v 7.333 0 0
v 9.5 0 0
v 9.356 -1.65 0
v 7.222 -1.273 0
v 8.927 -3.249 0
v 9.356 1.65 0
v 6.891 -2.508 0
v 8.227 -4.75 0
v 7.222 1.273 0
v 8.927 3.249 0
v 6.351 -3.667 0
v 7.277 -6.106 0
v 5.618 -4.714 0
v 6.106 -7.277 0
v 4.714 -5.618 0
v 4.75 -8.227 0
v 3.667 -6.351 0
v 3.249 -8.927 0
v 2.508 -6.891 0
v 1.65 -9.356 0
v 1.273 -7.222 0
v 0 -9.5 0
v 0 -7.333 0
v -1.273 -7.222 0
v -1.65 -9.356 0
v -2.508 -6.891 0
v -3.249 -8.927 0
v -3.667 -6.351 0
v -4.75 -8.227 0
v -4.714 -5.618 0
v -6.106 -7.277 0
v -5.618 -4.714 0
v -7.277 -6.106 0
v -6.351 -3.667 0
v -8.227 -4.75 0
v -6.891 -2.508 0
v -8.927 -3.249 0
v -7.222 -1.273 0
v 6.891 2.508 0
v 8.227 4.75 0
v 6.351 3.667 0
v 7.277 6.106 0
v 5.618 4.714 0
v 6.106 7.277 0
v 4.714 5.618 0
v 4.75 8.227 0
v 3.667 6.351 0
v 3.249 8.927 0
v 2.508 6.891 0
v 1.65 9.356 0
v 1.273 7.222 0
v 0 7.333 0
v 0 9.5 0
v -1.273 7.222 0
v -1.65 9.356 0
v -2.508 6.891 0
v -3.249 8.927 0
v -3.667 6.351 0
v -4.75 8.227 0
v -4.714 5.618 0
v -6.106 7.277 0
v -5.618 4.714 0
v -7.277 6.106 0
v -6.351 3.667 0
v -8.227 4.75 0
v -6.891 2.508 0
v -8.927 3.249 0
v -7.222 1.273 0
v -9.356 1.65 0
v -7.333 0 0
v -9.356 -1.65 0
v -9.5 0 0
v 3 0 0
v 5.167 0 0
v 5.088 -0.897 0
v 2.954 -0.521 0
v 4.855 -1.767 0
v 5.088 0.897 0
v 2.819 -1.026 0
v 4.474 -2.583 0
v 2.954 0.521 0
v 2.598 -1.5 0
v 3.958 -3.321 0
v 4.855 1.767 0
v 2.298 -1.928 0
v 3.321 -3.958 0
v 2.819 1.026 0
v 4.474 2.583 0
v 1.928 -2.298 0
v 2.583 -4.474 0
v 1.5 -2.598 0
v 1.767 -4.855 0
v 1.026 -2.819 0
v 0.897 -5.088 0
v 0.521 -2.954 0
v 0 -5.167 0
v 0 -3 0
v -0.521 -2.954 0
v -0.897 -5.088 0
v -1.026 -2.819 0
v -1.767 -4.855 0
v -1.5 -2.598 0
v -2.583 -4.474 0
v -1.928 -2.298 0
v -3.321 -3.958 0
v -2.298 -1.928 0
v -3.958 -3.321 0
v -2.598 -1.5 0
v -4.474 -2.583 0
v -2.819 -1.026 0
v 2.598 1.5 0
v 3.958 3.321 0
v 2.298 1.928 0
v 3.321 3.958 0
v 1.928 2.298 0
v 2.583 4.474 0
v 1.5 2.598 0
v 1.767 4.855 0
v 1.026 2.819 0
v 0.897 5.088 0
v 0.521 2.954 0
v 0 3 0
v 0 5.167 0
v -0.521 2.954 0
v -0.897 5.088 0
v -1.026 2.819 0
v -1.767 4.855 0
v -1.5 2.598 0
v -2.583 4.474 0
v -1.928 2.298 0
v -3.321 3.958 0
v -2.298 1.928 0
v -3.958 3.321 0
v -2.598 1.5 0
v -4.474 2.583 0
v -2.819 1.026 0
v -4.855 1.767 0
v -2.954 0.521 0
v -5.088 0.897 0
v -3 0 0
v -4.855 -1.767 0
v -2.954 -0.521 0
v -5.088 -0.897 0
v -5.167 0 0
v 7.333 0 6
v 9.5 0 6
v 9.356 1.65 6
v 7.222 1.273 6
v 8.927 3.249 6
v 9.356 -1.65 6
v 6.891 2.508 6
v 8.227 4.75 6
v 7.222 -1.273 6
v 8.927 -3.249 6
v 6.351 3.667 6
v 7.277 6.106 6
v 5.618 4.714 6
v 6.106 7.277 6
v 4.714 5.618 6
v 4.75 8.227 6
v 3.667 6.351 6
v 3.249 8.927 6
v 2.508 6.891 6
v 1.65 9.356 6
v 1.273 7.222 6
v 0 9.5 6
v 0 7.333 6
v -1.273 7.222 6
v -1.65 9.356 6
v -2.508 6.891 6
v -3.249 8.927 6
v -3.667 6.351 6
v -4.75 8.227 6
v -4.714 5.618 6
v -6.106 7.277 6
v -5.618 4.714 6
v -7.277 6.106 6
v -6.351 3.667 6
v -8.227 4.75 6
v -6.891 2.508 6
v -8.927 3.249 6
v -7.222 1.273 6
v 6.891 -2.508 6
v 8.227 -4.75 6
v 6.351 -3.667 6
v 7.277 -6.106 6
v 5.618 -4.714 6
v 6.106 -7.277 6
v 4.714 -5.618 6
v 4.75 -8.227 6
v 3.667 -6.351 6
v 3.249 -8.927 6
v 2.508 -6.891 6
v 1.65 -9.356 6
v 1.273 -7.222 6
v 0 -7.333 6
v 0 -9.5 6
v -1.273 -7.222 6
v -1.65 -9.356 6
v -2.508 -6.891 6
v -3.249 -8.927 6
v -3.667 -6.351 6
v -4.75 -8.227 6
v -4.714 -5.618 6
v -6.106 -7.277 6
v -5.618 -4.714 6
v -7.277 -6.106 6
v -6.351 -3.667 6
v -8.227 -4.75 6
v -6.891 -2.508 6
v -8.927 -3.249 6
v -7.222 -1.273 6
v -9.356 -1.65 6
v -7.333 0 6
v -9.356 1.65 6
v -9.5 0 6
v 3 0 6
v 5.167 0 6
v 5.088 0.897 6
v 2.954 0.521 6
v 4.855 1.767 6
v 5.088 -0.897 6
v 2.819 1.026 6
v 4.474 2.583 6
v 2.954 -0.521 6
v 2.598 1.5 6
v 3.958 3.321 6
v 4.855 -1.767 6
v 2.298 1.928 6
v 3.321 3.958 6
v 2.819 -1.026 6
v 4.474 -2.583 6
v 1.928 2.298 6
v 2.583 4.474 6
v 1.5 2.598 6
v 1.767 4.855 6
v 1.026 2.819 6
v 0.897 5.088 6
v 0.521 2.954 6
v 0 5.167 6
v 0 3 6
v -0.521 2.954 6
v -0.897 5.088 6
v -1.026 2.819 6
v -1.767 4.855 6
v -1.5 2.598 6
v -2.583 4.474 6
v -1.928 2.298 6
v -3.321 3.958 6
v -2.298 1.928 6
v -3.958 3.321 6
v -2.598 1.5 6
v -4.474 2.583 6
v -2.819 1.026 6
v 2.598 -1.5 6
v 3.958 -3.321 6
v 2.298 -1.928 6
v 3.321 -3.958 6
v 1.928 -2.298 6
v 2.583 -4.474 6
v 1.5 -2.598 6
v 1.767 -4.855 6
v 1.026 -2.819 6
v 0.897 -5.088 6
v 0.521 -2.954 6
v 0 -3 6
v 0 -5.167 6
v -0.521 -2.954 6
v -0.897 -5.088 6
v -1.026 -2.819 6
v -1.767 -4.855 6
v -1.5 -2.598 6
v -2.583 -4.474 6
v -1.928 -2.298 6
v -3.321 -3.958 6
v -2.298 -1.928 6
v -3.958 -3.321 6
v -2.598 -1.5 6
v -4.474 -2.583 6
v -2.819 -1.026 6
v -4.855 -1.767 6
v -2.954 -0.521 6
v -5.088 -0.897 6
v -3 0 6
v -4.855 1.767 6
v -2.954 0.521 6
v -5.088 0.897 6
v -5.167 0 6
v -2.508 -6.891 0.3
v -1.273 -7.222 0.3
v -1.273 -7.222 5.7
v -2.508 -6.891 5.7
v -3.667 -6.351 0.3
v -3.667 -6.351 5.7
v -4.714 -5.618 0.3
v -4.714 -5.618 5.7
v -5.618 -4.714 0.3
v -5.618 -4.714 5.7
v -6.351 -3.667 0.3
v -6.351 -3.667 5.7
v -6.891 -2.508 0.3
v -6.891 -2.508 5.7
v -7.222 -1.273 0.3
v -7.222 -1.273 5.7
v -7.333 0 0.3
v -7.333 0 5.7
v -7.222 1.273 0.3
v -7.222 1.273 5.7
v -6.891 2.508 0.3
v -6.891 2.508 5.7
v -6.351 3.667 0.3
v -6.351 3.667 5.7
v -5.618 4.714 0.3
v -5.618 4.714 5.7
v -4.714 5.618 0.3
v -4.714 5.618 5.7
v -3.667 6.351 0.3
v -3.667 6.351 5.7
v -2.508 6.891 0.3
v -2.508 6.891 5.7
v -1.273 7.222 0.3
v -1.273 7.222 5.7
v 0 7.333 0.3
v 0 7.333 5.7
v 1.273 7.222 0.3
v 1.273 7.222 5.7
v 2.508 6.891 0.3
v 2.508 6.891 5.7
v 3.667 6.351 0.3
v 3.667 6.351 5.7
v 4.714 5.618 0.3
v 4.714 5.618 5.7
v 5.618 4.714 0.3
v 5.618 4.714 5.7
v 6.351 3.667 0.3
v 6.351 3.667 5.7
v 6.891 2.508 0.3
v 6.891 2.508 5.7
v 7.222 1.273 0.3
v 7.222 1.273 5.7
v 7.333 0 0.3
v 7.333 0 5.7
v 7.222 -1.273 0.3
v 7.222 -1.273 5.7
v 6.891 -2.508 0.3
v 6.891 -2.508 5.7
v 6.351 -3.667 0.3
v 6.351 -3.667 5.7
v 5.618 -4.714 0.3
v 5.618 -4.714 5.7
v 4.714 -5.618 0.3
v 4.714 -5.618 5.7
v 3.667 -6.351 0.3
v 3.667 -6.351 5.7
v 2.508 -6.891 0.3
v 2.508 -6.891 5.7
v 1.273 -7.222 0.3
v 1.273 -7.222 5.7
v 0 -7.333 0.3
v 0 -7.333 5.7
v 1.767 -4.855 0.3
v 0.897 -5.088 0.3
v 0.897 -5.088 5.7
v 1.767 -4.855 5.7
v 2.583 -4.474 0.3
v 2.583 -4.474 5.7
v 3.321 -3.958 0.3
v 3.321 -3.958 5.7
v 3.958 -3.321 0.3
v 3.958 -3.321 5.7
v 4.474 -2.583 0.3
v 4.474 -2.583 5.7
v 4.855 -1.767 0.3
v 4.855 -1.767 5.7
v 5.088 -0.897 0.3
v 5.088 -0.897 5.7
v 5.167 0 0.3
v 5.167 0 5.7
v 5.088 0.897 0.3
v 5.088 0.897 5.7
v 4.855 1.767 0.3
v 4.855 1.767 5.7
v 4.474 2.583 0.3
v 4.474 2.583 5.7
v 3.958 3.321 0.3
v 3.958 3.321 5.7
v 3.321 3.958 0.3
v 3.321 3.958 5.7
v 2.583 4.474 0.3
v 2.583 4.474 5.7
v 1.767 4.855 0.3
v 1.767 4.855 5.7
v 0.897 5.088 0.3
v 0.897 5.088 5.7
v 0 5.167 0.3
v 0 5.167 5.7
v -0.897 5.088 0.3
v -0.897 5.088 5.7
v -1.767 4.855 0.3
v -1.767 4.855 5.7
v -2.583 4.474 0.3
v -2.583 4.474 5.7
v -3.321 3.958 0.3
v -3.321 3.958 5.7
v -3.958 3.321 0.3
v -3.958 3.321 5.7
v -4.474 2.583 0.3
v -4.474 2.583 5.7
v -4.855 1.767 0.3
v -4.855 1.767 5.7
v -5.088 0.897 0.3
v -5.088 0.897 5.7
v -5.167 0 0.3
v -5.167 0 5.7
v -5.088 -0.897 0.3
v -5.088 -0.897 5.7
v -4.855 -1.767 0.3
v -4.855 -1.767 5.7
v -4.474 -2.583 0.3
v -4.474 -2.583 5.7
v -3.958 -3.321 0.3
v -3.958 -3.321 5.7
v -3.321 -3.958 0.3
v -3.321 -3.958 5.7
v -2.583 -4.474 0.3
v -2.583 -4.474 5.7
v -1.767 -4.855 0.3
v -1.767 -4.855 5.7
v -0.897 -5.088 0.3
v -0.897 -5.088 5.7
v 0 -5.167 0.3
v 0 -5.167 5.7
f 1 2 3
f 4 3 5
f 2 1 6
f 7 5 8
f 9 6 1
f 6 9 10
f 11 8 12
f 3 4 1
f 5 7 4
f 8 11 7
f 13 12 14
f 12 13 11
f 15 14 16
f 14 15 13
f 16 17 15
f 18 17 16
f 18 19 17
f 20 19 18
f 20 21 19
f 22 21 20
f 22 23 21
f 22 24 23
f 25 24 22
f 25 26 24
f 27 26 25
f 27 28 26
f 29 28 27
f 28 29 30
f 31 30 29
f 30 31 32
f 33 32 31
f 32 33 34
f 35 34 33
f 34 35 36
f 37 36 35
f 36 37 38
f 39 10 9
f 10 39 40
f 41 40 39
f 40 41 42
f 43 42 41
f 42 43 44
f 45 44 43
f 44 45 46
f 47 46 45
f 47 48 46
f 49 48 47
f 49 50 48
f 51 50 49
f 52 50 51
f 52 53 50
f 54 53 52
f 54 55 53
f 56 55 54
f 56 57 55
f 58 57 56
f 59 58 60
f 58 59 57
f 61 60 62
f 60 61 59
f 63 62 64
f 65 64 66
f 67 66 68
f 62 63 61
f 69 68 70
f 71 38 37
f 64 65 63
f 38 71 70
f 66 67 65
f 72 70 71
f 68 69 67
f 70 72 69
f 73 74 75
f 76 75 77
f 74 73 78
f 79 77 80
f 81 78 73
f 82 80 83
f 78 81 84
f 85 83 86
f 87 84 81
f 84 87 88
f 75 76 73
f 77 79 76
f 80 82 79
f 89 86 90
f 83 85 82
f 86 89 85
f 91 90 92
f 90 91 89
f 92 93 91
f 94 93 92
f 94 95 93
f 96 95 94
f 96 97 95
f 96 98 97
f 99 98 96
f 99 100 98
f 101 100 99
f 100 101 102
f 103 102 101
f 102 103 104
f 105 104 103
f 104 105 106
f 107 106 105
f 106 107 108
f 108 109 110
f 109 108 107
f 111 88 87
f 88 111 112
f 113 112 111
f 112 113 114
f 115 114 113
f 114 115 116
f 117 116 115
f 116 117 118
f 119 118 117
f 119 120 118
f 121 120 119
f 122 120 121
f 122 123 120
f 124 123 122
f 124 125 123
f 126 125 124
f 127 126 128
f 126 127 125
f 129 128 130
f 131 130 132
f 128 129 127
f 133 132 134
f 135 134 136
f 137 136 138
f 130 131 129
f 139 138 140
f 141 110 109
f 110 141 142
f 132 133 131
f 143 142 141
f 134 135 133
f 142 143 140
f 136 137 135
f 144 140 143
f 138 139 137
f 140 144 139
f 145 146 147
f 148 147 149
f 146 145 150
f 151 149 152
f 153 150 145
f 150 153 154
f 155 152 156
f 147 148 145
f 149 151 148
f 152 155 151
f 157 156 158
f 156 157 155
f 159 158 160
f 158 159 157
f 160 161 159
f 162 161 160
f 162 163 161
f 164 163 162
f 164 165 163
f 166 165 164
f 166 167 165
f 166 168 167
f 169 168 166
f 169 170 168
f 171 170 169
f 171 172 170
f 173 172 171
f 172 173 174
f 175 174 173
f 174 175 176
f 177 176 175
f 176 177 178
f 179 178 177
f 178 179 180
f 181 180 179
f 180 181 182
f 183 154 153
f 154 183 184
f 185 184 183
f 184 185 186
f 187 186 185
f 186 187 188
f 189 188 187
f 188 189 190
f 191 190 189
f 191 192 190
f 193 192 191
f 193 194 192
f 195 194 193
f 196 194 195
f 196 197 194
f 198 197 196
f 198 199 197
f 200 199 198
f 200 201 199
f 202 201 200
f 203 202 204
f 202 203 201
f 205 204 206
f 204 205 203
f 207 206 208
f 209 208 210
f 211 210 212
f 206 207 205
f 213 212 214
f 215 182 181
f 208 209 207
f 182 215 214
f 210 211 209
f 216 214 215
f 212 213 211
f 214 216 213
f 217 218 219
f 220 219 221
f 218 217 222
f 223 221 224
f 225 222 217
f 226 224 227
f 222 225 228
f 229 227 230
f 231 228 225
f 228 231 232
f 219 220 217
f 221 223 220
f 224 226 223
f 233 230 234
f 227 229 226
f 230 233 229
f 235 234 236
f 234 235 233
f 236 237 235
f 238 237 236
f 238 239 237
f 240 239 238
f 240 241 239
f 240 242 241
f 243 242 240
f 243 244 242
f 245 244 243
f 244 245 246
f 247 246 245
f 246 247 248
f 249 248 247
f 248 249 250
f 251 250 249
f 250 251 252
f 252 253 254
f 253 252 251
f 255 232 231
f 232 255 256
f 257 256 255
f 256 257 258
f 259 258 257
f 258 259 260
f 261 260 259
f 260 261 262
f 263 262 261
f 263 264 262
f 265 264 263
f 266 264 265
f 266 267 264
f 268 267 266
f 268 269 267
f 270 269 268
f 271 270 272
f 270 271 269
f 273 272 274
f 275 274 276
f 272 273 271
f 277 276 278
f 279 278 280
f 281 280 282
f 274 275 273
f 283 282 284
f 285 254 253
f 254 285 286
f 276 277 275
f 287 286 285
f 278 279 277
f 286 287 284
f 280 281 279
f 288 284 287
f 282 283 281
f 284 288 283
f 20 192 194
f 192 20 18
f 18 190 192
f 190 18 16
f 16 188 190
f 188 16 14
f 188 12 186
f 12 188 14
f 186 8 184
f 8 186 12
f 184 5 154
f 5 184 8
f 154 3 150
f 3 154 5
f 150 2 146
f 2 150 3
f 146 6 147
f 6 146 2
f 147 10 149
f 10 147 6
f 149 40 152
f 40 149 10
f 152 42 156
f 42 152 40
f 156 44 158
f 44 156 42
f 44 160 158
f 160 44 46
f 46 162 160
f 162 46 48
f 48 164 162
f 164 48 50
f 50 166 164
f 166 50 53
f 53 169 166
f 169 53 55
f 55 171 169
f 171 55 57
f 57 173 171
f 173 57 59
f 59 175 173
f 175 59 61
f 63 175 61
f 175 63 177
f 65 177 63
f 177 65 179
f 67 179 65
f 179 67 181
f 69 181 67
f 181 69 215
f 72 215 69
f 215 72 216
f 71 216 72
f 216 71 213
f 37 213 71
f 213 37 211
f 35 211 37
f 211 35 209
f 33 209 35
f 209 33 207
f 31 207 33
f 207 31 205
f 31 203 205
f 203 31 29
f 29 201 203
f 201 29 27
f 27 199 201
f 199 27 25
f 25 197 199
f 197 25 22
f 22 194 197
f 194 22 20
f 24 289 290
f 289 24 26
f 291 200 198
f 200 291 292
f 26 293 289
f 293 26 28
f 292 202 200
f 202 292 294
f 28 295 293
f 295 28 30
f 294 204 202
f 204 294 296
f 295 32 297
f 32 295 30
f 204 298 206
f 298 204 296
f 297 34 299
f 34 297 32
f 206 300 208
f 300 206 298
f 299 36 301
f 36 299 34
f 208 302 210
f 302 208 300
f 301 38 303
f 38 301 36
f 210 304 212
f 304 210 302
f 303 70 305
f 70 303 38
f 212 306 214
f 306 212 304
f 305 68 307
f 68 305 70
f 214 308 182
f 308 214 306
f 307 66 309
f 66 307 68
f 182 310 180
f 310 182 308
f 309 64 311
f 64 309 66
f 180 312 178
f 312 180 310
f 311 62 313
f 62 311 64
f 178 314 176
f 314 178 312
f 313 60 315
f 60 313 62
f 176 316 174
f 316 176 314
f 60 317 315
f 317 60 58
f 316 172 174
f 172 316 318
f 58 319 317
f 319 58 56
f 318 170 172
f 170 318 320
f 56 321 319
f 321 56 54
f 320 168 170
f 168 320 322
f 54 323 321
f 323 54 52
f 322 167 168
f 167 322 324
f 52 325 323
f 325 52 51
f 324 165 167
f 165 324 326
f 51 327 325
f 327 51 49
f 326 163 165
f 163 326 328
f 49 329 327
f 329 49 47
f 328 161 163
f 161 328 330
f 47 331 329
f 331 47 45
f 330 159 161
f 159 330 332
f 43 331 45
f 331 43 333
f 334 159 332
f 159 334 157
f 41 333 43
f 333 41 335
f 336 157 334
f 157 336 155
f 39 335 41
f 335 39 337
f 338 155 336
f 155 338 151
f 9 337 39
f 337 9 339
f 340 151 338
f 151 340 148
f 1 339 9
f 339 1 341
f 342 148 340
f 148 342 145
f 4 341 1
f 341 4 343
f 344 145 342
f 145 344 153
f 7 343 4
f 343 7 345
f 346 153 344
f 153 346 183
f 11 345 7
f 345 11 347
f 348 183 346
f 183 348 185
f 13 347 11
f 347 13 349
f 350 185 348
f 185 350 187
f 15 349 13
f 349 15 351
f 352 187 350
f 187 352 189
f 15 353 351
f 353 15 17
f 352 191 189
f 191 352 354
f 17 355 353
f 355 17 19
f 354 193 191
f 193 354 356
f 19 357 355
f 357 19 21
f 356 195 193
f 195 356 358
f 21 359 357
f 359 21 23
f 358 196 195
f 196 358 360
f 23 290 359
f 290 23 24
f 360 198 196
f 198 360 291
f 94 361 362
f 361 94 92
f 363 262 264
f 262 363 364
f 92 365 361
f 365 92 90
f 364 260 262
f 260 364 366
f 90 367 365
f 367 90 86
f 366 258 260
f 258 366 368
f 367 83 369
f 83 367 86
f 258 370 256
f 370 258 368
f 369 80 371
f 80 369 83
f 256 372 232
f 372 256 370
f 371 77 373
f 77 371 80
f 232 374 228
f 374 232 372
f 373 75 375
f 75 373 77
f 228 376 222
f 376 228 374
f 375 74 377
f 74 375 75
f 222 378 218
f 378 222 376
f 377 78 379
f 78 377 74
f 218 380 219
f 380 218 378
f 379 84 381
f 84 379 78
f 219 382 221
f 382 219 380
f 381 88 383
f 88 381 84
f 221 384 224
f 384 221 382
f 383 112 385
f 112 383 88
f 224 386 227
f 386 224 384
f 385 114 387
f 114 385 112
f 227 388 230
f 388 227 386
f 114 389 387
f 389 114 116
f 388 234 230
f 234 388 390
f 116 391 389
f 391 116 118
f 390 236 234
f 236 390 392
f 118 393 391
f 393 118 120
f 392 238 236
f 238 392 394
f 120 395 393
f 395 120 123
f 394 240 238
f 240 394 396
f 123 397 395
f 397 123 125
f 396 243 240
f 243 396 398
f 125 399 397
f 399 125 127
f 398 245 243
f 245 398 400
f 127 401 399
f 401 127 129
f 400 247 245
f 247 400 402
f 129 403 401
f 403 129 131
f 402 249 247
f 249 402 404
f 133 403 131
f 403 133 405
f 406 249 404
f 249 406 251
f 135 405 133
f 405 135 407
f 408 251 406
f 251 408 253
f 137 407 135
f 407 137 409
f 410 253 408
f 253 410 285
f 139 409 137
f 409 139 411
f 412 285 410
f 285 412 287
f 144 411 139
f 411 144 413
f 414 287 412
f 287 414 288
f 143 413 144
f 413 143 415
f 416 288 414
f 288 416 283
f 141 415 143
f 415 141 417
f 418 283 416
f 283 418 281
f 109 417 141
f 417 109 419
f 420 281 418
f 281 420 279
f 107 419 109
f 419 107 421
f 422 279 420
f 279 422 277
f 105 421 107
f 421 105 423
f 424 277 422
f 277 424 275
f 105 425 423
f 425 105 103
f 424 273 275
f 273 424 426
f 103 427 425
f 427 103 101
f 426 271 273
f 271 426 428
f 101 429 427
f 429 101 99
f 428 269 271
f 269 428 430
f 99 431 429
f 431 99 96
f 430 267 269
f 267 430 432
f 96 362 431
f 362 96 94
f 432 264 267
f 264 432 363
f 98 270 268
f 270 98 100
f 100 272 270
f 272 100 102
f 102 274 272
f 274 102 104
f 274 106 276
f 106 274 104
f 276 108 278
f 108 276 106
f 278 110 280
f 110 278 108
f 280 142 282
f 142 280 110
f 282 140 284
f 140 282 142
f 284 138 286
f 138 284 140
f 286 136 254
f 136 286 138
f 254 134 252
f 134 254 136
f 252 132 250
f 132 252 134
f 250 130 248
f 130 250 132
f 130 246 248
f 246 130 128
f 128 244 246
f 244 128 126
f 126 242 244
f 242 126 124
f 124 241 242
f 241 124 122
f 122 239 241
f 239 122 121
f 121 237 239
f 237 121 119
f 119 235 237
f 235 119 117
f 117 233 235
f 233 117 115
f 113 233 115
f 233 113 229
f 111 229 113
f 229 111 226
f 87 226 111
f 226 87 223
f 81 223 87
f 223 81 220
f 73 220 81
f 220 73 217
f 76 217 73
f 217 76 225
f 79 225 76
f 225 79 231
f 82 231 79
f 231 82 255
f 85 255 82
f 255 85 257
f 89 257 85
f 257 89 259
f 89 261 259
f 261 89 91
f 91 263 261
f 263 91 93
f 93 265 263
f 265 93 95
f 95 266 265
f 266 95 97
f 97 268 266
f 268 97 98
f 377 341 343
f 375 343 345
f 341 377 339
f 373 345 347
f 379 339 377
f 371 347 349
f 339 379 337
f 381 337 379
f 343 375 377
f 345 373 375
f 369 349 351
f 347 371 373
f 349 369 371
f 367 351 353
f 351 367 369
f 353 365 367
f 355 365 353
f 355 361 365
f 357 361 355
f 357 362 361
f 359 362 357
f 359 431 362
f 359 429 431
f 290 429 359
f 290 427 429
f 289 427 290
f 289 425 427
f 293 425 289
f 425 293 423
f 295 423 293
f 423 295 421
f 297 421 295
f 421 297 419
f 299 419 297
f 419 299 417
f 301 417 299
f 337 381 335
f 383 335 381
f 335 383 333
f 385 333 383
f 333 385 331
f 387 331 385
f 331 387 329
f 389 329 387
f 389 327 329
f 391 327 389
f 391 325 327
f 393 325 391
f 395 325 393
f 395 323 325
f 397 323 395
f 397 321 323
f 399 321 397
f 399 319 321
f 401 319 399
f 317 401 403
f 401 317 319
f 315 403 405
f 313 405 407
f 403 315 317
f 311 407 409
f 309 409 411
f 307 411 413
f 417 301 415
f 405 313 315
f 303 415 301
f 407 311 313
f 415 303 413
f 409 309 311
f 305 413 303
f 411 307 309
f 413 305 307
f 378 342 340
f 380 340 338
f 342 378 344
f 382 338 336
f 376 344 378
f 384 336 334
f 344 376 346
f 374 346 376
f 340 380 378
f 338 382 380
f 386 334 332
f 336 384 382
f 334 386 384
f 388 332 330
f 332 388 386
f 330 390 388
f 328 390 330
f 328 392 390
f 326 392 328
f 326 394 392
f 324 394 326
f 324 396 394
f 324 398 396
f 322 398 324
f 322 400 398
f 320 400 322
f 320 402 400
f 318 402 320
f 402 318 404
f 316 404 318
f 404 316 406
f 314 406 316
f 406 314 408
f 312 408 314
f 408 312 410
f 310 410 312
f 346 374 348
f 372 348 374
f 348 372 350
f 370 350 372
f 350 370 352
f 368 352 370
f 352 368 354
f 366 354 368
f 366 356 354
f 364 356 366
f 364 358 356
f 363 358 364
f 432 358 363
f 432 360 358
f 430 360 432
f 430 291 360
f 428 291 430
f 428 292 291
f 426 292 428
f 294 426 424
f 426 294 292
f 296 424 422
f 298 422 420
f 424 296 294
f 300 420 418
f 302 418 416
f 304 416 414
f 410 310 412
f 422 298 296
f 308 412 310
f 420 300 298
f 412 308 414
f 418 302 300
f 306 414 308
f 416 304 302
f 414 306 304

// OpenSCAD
//search:   ^([\d.]+)\t([\d.]+)\t([\d.]+)\t.+\t([^\t]+)\t[^\t]*$
//replace:  ["$4",[$1,$2,$3]],

bearing_sizes = [
["603",[3,9,3]],
["604",[4,12,4]],
["605",[5,14,5]],
["606",[6,17,6]],
["607",[7,19,6]],
["608",[8,22,7]],
["609",[9,24,7]],
["617/3",[3,6,2]],
["617/4 R",[4,7,2]],
["617/4 X",[4,8,2]],
["617/4",[4,7,2]],
["617/5",[5,8,2]],
["617/6",[6,10,2.5]],
["617/7",[7,11,2.5]],
["617/8",[8,12,2.5]],
["617/9",[9,14,3]],
["618/3",[3,7,2]],
["618/4",[4,9,2.5]],
["618/5",[5,11,3]],
["618/6",[6,13,3.5]],
["618/7",[7,14,3.5]],
["618/8",[8,16,4]],
["618/9",[9,17,4]],
["619/3",[3,8,3]],
["619/4",[4,11,4]],
["619/5",[5,13,4]],
["619/6",[6,15,5]],
["619/7",[7,17,5]],
["619/8",[8,19,6]],
["619/9",[9,20,6]],
["623",[3,10,4]],
["624",[4,13,5]],
["625",[5,16,5]],
["626",[6,19,6]],
["627 R",[7,22,7]],
["627 X",[7,13,3]],
["627",[7,22,7]],
["627/5 X",[5,9,2.5]],
["627/6 X",[6,12,3]],
["628",[8,24,8]],
["629",[9,26,8]],
["633",[3,13,5]],
["634",[4,16,5]],
["635",[5,19,6]],
["636",[6,22,7]],
["637",[7,26,9]],
["637/4 X",[4,10,3]],
["637/8 X",[8,14,3.5]],
["638",[8,28,9]],
["639",[9,30,10]],
["6000",[10,26,8]],
["6001",[12,28,8]],
["6002",[15,32,9]],
["6003",[17,35,10]],
["6004",[20,42,12]],
["6200",[10,30,9]],
["6201",[12,32,10]],
["6202",[15,35,11]],
["6203",[17,40,12]],
["6204",[20,47,14]],
["6300",[10,35,11]],
["6301",[12,37,12]],
["6302",[15,42,13]],
["6303",[17,47,14]],
["6304",[20,52,15]],
["6403",[17,62,17]],
["6404",[20,72,19]],
["8703",[3,8,2.5]],
["8704",[3,9,2.5]],
["8705",[5,10,3]],
["16002",[15,32,8]],
["16003",[17,35,8]],
["16004",[20,42,8]],
["16100",[10,28,8]],
["16101",[12,30,8]],
["61700",[10,15,3]],
["61701",[12,18,4]],
["61702",[15,21,4]],
["61703",[17,23,4]],
["61704",[20,27,4]],
["61800",[10,19,5]],
["61801",[12,21,5]],
["61802",[15,24,5]],
["61803",[17,26,5]],
["61804",[20,32,7]],
["61900",[10,22,6]],
["61901",[12,24,6]],
["61902",[15,28,7]],
["61903",[17,30,7]],
["61904",[20,37,9]],
["63800",[10,19,7]],
["63801",[12,21,7]],
["63802",[15,24,7]],
["63803",[17,26,7]],
["63804",[20,32,10]],
["ETN9",[20,47,14]],
["ETN9",[20,52,15]],
["N",[20,47,14]],
["N",[20,52,15]],
["NR",[12,32,10]],
["NR",[15,35,11]],
["NR",[17,40,12]],
["NR",[20,42,12]],
["NR",[20,47,14]],
["NR",[20,52,15]],
];

function rb_size(type) = bearing_sizes[search([type], bearing_sizes, num_returns_per_match = 1, index_col_num = 0)[0]][1];

function rb_d(type) = rb_size(type)[0];
function rb_D(type) = rb_size(type)[1];
function rb_B(type) = rb_size(type)[2];
function rb_D1(type) = (2*rb_D(type)+rb_d(type))/3;
function rb_d1(type) = (2*rb_d(type)+rb_D(type))/3;

module generic_roller_bearing(d = rb_d("626"), D = rb_D("626"), B = rb_B("626"), d1 = rb_d1("626"), D1 = rb_D1("626"))
{
    color("gray")
    {
        linear_extrude(B) 
        {
            difference() {circle(d = D); circle(d = D1);}
            difference() {circle(d = d1); circle(d = d);}
        }
    }
    translate([0,0,0.05*B]) 
    {
        color("lightgray") 
        {
            linear_extrude(0.9*B) {difference() {circle(d = D1);circle(d = d1);}}
        }
    }
}

module roller_bearing(type = "626")
{
    echo("RBType", type,concat(rb_size(type),[rb_D1(type),rb_d1(type)]));
    generic_roller_bearing(d = rb_d(type), D = rb_D(type), B = rb_B(type), d1 = rb_d1(type), D1 = rb_D1(type));
}

roller_bearing($fn = 36);
